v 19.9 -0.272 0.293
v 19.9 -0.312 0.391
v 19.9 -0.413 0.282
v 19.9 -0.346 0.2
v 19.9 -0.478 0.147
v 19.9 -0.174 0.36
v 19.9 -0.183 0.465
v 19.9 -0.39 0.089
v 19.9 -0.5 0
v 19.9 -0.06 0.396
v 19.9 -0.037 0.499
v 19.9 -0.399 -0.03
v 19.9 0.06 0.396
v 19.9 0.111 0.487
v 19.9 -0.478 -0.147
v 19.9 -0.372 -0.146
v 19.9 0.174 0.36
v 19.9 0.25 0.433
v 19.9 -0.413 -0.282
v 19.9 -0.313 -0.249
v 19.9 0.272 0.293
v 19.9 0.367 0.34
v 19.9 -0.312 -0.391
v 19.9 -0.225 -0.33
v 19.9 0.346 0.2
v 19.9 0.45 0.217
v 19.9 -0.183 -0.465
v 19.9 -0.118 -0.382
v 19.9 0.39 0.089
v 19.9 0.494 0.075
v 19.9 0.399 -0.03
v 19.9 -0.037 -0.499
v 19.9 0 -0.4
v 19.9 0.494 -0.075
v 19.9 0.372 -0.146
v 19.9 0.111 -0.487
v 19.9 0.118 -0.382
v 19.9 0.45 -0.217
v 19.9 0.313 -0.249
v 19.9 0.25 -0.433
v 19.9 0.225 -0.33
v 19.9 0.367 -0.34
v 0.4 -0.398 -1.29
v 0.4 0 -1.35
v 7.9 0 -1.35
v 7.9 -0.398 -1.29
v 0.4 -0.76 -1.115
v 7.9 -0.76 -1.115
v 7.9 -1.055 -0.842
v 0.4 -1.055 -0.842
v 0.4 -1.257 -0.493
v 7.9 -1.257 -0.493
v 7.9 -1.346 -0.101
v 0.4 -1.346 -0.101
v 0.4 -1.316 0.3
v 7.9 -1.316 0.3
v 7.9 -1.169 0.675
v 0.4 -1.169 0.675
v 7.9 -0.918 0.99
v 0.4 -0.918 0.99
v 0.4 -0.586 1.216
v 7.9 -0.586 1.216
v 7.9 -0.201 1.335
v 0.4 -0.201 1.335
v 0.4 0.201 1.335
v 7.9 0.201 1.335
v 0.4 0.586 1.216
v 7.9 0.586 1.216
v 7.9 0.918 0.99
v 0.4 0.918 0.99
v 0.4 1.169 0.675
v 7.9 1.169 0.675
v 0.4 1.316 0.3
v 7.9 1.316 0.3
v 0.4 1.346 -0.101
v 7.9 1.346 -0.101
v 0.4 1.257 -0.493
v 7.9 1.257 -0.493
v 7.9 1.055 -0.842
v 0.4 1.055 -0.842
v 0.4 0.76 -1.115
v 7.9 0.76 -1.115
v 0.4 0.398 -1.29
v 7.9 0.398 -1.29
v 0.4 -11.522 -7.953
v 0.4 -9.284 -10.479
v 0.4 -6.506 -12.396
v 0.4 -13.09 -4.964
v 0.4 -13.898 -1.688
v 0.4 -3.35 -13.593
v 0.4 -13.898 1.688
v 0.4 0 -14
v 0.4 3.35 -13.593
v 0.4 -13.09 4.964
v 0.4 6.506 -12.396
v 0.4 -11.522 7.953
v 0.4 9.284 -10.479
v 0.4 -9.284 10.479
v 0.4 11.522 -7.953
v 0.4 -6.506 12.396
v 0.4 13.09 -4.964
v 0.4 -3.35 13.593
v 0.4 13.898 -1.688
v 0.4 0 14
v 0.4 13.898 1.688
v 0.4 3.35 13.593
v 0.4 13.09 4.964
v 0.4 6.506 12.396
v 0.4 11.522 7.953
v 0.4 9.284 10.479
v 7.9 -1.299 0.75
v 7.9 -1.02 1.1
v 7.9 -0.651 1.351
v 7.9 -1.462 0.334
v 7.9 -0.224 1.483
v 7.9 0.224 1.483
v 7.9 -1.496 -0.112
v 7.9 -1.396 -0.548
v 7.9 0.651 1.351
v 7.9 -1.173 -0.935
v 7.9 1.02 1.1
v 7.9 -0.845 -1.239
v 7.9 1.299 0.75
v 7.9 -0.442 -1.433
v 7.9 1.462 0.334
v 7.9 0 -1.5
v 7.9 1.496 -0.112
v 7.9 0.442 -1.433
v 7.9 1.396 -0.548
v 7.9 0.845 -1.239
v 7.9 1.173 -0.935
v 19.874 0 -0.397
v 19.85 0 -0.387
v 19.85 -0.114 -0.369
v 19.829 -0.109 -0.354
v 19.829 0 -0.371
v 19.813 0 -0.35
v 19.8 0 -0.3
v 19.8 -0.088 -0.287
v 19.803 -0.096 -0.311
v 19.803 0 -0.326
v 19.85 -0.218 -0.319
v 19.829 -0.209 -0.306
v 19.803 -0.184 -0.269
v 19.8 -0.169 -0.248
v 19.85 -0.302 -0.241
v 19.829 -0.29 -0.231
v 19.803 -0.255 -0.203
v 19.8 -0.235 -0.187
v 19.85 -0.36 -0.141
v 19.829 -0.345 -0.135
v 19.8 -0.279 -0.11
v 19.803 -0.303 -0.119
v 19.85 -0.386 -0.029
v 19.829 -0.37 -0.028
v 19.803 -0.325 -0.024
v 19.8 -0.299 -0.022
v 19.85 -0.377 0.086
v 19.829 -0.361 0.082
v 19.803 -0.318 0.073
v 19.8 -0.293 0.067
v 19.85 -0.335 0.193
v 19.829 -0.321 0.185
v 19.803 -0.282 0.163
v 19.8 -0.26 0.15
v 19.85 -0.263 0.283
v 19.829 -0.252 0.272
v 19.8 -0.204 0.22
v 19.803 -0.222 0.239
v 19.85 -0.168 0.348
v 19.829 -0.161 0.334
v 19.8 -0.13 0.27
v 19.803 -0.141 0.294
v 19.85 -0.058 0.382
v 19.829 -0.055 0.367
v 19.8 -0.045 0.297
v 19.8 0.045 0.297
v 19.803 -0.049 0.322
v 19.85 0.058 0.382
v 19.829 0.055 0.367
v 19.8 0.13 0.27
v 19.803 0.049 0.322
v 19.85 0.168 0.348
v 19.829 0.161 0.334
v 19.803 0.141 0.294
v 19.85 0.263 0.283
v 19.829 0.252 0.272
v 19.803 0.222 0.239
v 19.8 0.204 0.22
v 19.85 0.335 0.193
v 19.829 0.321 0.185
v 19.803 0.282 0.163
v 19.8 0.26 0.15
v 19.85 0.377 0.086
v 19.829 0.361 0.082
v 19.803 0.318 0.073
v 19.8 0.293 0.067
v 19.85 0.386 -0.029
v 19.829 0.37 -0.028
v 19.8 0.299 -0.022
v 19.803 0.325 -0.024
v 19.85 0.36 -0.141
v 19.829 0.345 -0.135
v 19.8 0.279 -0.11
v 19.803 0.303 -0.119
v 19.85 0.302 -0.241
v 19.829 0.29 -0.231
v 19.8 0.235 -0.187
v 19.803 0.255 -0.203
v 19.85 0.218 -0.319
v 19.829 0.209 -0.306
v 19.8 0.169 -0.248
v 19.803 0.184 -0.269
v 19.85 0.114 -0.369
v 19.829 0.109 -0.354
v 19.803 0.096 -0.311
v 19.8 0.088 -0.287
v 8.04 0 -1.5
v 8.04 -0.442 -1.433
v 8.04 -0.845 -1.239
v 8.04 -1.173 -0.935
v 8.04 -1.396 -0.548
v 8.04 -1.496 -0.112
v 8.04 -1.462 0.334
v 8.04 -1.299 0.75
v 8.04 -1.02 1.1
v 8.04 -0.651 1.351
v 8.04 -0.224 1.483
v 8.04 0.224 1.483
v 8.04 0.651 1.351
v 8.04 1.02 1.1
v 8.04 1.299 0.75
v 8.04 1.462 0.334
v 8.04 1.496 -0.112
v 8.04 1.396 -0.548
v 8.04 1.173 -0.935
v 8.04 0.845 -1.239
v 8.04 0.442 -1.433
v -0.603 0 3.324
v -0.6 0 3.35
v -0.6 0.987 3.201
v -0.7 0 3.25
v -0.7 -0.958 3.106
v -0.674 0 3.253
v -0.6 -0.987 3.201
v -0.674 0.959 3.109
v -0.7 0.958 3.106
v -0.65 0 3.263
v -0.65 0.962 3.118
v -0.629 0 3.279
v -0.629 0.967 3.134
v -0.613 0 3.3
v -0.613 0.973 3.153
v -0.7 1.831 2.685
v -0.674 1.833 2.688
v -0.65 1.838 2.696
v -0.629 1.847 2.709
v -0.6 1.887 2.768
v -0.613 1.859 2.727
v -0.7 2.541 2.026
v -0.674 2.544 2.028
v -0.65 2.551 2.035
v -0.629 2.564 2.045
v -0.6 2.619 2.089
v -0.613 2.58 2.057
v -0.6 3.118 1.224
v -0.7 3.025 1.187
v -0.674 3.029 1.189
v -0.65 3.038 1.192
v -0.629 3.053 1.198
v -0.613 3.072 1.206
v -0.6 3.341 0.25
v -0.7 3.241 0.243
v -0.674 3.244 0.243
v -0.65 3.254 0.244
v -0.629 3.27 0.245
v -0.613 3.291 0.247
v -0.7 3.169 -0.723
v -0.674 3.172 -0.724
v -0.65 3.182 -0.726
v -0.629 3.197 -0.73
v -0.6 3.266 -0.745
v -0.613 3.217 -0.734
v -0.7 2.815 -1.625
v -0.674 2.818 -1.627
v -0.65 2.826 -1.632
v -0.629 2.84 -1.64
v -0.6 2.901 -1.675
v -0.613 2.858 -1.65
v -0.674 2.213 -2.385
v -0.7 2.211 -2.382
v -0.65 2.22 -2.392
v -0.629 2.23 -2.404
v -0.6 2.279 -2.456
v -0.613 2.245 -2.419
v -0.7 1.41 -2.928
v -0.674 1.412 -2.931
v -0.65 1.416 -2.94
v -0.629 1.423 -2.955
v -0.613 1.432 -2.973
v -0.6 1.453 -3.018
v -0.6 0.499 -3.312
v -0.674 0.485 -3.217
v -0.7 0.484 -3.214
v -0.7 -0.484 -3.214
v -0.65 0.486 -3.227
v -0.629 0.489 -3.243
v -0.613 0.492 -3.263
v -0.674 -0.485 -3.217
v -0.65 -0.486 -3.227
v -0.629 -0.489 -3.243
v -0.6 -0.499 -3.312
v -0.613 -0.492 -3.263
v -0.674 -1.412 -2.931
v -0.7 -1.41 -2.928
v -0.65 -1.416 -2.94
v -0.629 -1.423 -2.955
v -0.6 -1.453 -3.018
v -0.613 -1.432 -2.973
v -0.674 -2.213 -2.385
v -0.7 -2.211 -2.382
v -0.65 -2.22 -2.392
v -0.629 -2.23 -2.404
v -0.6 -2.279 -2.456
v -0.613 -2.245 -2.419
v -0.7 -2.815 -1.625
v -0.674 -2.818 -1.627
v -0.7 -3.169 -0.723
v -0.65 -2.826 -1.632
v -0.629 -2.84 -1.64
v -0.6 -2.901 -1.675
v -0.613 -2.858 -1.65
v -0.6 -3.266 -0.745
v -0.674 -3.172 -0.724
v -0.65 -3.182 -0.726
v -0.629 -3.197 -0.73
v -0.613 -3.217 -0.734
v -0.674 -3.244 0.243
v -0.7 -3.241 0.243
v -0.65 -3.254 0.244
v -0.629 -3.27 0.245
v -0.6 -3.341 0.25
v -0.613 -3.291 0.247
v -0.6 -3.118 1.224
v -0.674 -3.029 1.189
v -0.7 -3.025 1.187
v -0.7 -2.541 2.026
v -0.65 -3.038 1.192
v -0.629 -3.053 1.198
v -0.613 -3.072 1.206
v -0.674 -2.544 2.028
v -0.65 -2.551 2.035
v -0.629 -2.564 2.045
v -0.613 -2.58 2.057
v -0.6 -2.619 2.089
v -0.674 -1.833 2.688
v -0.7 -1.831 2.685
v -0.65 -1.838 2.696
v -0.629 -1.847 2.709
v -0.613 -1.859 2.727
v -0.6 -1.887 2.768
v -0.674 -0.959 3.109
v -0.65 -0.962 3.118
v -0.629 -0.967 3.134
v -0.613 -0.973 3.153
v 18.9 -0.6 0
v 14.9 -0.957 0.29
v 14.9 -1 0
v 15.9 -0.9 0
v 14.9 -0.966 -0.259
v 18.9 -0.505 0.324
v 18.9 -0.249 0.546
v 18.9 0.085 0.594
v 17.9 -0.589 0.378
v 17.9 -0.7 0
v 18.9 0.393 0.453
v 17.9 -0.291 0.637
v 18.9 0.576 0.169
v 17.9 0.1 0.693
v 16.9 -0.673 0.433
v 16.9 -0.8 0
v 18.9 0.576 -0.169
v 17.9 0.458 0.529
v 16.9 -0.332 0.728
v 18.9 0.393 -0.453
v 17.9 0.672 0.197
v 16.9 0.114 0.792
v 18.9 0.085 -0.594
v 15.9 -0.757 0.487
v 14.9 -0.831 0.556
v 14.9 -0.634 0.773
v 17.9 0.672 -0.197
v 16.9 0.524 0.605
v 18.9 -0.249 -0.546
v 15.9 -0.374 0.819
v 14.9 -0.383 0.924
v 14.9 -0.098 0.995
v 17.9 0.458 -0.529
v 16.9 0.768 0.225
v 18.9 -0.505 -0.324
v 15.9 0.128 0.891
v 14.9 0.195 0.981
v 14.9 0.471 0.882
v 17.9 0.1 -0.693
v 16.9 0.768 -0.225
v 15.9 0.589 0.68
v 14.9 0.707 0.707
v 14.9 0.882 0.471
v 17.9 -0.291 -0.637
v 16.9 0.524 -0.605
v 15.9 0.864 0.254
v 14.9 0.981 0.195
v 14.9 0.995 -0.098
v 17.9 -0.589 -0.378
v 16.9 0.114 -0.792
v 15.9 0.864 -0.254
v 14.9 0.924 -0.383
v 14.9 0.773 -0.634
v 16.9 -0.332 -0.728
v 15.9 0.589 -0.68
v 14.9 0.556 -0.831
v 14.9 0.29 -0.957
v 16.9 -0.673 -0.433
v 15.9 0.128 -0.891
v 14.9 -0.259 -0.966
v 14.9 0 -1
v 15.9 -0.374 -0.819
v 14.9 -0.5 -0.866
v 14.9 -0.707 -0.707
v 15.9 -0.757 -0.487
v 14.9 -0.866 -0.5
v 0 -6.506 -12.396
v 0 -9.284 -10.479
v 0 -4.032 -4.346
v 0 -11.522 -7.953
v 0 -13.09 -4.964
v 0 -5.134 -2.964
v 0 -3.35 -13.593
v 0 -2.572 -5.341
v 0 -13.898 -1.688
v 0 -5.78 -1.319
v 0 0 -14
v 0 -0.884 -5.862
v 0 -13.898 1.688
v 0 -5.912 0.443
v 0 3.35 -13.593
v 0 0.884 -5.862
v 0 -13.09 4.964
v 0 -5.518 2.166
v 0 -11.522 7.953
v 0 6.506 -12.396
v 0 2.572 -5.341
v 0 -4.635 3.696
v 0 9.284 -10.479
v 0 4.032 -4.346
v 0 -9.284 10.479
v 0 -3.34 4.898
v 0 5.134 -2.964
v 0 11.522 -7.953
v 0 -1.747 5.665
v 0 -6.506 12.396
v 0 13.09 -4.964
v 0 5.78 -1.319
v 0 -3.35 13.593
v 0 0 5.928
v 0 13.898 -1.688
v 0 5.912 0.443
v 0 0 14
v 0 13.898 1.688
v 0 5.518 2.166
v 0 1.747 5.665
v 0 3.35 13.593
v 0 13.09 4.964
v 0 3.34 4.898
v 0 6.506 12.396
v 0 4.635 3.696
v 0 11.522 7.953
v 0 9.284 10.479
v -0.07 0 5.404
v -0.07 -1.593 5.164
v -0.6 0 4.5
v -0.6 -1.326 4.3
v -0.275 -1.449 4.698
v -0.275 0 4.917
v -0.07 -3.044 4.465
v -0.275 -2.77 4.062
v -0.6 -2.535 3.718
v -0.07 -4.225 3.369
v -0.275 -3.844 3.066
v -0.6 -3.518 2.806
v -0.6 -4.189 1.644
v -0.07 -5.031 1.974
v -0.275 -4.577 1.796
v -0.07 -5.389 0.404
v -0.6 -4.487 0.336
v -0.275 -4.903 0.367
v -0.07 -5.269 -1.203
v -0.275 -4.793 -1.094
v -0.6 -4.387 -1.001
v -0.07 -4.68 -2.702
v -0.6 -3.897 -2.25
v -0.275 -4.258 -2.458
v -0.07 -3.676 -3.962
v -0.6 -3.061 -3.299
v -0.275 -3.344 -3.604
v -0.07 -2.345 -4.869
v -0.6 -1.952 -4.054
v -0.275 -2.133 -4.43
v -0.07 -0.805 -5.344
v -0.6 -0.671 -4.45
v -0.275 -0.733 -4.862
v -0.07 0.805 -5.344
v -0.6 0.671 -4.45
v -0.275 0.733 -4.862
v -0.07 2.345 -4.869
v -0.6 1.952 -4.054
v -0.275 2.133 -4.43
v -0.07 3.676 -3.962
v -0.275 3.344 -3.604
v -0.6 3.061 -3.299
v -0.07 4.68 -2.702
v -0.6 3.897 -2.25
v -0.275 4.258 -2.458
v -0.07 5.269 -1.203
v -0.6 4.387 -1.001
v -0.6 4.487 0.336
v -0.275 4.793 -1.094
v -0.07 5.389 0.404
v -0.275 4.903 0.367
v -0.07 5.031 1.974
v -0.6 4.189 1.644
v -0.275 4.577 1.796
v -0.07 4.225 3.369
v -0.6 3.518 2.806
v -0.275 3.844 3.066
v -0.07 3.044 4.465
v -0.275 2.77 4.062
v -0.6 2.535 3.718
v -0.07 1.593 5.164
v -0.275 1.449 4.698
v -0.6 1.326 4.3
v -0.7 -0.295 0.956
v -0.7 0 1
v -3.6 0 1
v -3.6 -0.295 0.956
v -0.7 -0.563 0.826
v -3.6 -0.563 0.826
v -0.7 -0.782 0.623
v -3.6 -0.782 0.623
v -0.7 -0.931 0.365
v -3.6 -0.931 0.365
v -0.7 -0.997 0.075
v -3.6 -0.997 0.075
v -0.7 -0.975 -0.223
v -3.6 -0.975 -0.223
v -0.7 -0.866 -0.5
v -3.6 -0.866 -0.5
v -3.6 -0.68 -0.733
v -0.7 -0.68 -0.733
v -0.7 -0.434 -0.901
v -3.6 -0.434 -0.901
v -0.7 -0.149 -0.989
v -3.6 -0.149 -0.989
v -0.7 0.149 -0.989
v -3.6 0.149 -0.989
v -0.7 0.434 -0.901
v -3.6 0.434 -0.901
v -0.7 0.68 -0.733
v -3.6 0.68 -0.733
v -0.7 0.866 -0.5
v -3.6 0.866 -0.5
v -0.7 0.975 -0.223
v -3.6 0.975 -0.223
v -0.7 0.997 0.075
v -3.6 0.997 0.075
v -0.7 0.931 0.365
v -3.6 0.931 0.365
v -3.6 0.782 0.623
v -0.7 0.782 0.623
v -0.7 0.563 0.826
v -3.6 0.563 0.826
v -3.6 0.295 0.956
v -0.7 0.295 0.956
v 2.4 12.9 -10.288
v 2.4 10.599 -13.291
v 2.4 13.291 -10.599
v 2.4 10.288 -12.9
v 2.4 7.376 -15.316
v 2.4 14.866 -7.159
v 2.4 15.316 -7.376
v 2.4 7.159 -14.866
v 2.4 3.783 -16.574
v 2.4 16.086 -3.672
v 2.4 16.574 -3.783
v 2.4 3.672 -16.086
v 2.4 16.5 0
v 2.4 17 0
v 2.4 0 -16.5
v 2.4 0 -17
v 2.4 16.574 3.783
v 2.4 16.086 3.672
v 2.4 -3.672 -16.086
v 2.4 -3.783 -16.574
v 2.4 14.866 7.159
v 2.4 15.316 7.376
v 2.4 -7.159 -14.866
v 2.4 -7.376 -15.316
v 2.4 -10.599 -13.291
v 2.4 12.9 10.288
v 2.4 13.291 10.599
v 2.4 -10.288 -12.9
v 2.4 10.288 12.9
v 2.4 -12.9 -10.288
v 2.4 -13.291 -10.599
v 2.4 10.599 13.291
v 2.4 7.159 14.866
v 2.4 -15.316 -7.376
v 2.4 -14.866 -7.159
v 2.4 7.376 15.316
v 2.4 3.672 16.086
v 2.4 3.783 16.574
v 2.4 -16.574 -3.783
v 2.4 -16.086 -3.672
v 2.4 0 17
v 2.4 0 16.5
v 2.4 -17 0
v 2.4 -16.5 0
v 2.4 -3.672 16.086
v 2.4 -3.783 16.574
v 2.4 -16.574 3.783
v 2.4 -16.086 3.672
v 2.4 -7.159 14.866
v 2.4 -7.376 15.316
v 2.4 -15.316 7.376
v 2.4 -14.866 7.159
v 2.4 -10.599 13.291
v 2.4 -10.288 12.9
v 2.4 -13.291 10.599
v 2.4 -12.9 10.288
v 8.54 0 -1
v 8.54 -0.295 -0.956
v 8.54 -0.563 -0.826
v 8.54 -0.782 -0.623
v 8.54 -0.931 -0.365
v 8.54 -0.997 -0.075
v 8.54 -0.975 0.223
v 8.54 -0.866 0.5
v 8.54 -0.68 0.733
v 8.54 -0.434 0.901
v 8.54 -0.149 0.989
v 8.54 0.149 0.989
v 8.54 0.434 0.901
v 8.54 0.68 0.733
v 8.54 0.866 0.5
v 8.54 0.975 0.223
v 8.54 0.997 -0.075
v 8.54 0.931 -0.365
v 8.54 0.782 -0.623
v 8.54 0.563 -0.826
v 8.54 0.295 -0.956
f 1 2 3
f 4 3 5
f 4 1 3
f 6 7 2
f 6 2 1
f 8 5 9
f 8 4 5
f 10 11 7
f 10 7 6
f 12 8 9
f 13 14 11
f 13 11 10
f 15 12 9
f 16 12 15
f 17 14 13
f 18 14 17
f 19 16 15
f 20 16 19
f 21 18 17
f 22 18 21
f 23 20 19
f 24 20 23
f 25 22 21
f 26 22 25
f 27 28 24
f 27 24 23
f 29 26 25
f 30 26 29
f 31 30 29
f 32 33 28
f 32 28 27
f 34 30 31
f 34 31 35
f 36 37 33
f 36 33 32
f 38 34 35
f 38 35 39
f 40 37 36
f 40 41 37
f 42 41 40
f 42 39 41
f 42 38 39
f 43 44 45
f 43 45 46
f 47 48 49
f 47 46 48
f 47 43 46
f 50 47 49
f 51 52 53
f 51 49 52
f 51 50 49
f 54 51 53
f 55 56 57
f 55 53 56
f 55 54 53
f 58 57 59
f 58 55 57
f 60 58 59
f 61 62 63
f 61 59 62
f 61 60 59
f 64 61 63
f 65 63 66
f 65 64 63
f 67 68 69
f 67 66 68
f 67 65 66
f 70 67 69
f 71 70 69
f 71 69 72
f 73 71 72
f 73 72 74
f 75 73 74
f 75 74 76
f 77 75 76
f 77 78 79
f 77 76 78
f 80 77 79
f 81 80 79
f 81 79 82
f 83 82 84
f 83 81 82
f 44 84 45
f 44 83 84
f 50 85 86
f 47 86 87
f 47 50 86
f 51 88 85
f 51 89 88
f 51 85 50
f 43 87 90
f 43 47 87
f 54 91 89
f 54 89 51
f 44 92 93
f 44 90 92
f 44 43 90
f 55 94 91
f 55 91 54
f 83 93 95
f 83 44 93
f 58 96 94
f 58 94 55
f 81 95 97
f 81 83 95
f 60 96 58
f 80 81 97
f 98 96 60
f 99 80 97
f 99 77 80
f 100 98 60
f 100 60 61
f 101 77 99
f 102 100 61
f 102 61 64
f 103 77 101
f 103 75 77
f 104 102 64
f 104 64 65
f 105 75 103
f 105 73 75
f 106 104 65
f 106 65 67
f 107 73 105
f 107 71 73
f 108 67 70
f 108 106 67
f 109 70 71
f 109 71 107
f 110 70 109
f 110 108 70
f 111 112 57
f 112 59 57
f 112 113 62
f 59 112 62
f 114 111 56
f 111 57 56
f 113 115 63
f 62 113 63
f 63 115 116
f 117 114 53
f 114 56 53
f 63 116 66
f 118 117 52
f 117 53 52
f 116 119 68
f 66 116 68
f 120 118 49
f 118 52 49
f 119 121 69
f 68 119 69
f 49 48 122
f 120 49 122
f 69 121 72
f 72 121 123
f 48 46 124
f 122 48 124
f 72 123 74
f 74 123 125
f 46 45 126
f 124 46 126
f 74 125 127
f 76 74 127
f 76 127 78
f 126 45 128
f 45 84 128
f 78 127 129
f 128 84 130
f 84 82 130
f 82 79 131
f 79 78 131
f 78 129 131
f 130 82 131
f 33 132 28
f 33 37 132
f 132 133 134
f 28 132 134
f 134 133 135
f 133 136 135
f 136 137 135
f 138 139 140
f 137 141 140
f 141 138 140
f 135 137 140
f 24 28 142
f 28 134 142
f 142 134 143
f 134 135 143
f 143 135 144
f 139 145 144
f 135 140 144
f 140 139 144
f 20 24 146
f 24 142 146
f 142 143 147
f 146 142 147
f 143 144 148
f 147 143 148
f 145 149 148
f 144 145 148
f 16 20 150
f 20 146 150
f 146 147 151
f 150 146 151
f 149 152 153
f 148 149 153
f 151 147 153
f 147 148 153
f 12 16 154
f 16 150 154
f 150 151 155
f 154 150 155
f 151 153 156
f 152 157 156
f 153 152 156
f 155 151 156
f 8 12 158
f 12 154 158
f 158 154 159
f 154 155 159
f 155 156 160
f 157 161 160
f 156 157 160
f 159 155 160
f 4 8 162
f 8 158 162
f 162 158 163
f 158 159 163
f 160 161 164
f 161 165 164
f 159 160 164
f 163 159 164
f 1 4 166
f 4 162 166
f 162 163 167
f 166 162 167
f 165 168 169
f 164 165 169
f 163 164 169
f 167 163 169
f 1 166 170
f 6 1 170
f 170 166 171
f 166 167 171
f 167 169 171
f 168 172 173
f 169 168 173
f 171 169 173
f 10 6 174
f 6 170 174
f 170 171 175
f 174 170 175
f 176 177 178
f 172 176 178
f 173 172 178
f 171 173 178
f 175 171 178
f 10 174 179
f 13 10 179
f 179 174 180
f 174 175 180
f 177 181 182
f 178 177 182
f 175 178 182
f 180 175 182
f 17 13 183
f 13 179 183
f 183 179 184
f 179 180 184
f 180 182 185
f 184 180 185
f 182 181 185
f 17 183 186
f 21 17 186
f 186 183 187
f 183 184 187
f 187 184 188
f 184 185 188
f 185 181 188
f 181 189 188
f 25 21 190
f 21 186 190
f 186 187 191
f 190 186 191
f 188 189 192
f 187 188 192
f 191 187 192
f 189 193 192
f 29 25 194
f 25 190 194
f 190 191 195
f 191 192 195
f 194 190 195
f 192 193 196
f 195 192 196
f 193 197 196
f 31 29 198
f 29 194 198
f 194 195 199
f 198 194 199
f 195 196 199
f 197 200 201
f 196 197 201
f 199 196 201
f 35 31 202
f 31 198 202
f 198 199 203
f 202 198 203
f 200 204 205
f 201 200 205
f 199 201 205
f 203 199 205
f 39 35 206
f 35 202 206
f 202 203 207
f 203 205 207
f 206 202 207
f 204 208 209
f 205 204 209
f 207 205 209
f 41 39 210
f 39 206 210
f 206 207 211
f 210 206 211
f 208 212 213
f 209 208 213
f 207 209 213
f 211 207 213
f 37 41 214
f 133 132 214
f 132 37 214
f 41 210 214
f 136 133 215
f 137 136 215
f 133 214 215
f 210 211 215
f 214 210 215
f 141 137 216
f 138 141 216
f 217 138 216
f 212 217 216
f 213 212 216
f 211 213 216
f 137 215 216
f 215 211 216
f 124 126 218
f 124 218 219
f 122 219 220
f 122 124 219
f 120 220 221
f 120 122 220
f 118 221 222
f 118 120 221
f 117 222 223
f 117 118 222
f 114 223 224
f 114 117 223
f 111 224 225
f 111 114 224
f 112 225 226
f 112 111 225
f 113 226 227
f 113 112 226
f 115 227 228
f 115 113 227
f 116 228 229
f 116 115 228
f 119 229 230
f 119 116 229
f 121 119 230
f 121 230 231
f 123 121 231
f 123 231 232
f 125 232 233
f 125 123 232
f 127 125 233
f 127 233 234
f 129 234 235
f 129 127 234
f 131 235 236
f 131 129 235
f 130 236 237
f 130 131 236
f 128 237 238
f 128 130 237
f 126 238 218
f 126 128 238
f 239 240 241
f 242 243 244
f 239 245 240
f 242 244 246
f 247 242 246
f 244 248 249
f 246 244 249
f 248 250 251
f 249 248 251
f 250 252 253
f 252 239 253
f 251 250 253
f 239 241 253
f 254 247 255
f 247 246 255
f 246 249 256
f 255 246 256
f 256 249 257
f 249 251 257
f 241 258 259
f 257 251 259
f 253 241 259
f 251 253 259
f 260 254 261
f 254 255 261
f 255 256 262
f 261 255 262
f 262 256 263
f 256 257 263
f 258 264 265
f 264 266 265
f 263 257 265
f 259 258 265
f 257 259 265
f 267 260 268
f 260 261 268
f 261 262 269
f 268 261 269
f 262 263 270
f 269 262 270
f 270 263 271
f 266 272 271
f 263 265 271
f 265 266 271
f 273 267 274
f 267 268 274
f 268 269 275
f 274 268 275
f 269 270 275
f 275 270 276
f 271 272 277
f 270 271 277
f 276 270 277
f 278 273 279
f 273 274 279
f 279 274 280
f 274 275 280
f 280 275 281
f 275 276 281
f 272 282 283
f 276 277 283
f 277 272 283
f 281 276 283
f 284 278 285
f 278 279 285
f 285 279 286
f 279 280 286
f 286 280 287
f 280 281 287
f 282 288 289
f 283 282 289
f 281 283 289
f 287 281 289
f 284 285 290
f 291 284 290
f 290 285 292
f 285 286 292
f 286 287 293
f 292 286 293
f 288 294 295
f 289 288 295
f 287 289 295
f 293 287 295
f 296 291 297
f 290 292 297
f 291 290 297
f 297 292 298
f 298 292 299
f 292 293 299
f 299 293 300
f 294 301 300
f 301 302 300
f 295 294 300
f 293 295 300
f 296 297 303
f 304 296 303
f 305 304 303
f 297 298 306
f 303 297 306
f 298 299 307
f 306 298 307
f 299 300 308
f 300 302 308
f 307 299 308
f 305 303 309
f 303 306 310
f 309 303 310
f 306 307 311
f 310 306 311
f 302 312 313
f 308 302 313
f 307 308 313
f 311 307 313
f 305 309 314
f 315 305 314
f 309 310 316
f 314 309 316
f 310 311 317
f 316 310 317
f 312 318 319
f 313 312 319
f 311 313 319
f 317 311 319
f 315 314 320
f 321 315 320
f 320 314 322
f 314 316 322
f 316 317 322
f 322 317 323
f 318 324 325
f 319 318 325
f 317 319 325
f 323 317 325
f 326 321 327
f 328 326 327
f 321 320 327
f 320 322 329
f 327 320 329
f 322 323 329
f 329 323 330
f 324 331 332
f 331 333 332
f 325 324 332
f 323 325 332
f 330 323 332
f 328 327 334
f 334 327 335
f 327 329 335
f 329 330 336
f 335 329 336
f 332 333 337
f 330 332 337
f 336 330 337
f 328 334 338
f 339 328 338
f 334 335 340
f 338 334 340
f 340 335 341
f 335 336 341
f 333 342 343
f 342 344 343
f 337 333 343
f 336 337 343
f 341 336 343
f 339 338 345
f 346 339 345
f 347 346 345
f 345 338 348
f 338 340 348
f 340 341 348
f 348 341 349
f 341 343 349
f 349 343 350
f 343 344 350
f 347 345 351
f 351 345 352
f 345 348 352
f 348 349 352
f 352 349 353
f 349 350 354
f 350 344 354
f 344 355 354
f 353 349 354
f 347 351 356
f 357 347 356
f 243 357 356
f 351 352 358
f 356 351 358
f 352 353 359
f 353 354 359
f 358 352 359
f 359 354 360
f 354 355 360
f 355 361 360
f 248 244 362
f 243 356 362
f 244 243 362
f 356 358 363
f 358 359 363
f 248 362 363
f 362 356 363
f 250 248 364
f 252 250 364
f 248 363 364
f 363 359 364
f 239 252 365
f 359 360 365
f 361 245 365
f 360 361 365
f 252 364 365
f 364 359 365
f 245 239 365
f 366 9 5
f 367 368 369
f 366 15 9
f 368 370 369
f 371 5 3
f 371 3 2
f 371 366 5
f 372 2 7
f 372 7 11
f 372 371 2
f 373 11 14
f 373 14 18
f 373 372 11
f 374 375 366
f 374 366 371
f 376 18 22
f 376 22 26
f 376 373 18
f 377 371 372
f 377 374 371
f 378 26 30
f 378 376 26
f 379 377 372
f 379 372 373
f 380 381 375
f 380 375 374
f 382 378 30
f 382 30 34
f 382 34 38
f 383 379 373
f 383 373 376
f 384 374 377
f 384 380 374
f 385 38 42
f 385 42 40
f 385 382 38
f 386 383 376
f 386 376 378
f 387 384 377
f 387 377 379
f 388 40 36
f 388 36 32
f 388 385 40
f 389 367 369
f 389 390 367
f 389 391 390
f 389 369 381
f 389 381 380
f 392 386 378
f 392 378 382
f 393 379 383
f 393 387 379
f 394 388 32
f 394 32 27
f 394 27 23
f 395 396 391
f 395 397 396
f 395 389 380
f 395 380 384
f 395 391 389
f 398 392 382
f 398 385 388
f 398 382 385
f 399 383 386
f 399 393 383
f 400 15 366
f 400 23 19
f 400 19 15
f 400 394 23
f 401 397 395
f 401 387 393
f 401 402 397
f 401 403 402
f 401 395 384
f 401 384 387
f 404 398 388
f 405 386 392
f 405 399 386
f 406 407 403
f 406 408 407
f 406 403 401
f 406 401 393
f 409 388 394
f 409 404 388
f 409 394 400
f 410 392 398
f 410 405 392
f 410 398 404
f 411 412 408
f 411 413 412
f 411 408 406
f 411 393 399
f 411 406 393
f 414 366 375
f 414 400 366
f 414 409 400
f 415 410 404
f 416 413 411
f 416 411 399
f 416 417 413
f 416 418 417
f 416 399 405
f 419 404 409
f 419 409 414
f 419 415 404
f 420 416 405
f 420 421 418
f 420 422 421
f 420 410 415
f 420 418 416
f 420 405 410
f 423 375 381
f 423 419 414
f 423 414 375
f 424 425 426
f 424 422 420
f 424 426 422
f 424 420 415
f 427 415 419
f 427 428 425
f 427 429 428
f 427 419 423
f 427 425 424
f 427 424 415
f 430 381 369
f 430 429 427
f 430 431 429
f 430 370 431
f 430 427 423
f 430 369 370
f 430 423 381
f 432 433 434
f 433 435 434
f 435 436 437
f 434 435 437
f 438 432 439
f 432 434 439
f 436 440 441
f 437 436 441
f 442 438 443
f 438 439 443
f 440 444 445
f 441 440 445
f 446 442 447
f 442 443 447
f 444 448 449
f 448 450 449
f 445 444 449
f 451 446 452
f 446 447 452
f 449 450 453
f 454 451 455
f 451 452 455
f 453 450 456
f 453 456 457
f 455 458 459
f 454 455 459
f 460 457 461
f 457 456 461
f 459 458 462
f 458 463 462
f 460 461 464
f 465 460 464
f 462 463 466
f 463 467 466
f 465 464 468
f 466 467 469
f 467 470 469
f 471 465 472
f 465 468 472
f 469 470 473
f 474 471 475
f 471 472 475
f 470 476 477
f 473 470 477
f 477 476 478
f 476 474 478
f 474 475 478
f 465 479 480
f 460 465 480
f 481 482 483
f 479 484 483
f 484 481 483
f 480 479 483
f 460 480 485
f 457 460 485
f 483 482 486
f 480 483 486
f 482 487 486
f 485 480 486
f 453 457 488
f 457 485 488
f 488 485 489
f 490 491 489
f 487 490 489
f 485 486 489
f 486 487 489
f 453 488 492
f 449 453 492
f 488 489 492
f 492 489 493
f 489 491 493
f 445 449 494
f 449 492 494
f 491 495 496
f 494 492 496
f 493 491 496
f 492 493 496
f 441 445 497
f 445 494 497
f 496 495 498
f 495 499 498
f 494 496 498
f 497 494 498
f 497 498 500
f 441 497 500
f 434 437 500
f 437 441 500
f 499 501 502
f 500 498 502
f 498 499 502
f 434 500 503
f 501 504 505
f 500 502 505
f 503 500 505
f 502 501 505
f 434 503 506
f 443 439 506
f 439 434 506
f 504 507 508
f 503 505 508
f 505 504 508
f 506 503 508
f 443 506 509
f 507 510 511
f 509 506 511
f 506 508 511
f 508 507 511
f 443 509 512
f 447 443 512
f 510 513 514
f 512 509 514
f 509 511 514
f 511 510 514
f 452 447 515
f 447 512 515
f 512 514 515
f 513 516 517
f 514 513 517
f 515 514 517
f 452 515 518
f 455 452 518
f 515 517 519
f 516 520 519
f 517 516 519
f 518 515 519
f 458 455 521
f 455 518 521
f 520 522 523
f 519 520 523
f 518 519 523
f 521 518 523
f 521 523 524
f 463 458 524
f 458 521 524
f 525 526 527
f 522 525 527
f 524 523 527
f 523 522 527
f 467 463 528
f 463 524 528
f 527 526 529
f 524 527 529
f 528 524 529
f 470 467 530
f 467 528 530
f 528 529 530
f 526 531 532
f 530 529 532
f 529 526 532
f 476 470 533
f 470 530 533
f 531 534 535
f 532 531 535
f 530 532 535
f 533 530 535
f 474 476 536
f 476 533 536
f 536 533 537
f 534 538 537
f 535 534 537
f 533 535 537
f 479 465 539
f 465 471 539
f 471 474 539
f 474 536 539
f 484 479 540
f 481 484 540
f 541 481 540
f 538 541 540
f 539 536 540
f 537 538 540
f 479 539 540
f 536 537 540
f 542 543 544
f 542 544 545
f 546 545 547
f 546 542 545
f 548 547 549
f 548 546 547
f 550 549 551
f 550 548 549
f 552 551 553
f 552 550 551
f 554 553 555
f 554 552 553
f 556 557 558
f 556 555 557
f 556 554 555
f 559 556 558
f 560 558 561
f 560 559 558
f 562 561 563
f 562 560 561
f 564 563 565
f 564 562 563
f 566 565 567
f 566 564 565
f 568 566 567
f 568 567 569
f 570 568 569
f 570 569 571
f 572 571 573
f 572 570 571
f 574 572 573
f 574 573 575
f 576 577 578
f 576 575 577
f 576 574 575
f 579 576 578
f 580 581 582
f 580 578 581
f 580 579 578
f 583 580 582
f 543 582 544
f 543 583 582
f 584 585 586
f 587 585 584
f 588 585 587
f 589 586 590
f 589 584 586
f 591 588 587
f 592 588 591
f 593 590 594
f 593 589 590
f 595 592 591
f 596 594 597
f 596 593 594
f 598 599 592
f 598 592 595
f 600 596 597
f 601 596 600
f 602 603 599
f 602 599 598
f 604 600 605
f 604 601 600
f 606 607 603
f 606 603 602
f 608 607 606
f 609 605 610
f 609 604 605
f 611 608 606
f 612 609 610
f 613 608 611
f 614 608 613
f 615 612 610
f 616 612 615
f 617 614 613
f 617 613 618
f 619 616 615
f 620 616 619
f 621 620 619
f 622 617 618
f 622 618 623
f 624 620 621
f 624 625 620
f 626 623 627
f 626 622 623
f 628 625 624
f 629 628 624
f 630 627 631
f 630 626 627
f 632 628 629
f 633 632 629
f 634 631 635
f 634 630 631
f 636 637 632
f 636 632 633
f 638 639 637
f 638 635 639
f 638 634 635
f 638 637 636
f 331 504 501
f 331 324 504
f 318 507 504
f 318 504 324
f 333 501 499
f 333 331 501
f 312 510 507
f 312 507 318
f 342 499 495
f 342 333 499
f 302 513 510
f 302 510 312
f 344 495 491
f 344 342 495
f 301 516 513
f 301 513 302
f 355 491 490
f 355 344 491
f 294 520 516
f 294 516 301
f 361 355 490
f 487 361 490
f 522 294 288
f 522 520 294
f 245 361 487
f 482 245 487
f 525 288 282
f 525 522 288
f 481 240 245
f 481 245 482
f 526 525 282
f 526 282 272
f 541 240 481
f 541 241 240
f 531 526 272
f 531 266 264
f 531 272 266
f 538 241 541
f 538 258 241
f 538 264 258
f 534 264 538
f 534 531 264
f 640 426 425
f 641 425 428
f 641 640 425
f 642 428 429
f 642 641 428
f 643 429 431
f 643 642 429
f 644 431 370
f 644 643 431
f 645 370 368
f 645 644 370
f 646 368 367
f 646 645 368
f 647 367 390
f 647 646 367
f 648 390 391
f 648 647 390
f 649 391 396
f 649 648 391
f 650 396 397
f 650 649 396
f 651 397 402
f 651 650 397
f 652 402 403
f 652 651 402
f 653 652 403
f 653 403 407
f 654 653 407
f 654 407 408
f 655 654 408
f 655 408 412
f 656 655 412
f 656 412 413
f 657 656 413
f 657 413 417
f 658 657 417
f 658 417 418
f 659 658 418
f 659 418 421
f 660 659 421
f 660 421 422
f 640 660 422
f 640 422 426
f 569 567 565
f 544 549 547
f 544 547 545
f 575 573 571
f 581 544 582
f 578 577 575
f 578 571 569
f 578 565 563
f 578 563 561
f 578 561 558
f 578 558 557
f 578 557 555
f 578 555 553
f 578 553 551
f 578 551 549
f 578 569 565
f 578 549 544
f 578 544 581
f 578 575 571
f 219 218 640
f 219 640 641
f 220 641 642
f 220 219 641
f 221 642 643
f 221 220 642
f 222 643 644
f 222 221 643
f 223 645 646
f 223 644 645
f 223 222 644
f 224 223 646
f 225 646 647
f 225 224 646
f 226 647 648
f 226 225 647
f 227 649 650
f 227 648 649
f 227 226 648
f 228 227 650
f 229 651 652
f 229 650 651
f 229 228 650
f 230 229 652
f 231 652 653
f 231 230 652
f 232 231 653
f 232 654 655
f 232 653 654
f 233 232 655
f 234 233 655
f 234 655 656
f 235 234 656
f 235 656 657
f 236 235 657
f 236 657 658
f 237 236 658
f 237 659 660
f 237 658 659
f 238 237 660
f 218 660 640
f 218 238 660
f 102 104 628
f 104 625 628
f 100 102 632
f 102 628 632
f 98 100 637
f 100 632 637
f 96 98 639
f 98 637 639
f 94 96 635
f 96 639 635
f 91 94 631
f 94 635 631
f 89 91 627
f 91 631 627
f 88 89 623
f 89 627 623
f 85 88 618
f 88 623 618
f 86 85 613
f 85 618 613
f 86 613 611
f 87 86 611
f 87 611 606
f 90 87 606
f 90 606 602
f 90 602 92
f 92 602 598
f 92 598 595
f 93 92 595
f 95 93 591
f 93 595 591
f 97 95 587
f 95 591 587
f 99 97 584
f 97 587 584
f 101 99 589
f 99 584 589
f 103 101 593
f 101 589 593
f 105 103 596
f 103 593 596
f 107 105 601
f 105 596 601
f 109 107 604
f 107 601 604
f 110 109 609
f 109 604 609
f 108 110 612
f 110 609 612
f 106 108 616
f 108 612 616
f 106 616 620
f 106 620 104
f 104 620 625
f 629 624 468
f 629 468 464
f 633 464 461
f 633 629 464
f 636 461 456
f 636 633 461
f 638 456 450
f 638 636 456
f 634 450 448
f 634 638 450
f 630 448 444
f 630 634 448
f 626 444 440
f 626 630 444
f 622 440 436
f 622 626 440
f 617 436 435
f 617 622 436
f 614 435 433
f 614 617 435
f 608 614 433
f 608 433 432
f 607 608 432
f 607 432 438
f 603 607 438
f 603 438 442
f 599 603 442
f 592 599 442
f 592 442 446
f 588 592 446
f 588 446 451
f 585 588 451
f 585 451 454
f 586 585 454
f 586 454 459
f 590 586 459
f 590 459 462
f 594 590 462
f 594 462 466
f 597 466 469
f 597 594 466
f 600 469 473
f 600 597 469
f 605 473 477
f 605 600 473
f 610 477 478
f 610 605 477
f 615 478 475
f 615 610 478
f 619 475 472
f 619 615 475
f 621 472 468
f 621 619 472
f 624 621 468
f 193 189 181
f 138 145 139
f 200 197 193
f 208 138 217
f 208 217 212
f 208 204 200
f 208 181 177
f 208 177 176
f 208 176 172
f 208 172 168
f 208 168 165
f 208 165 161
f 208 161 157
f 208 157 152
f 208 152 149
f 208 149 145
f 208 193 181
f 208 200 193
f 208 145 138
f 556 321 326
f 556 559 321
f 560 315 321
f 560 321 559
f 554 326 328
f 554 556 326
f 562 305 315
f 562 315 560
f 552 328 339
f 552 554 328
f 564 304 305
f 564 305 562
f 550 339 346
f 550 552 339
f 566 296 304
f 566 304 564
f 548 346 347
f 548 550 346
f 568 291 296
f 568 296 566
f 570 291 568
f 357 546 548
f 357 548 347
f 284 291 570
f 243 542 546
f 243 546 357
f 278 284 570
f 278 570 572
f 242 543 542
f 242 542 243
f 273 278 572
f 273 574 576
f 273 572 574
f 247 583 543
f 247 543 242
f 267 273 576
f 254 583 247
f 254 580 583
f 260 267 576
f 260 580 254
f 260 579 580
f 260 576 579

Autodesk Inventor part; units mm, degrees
ref_plane "YZ Plane" through (0, 0, 0) normal (1, 0, 0) x (0, 1, 0)
ref_plane "XZ Plane" through (0, 0, 0) normal (0, 1, 0) x (-1, 0, 0)
sketch "Sketch1" plane through (0, 0, 0) normal (1, 0, 0) x (0, 1, 0)
  circle A0 centre (0, 0) radius 17
  circle A1 centre (0, 0) radius 14
  dimension "d0" = 34
  dimension "d1" = 28
extrude "Extrusion1" add sketch "Sketch1" along normal blind 0.4 contours A1
ref_plane "Work Plane1" through (2.4, 0, 0) normal (1, 0, 0) x (0, 0, -1)
sketch "Sketch2" plane through (2.4, 0, 0) normal (1, 0, 0) x (0, 0, -1)
  circle A0 centre (0, 0) radius 17
  dimension "d5" = 34
sketch "Sketch3" plane through (0, 0, 0) normal (0, 1, 0) x (-1, 0, 0)
  line L0 (-2.4, 17) -> (-2.4, -17) projected
  line L1 (0, 14) -> (0, -14) projected
  line L2 (0, 14) -> (-2.4, 17)
  line L3 (-0.4, 14) -> (-0.4, -14) projected
  line L4 (-0.4, 14) -> (-2.4, 16.5)
  line L5 (-0.4, 0) -> (-1.3096, 0)
  line L6 (0, 14) -> (-0.4, 14)
  line L7 (-2.4, 16.5) -> (-2.4, 17)
  point P0 (0, 0)
revolve "Revolution1" add sketch "Sketch3" angle 360 about axis through (0.4, 0, 0) along (1, 0, 0)
sketch "Sketch4" plane through (0, 0, 0) normal (-1, 0, 0) x (0, 0, 1)
  circle A0 centre (0, 0) radius 14 projected
  circle A1 centre (0, 0) radius 4.5
  dimension "d7" = 9
extrude "Extrusion2" add sketch "Sketch4" along normal blind 0.6 contours A1
fillet "Fillet1" radius 2 1 edges at (0, 0, -4.5)
sketch "Sketch5" plane through (-0.6, 0, 0) normal (-1, 0, 0) x (0, 0, 1)
  circle A0 centre (0, 0) radius 4.5 projected
  circle A1 centre (0, 0) radius 1
  dimension "d11" = 2
extrude "Extrusion3" add sketch "Sketch5" along normal blind 3 contours A1
sketch "Sketch6" plane through (0.4, 0, 0) normal (1, 0, 0) x (0, 0, -1)
  circle A0 centre (0, 0) radius 14 projected
  circle A1 centre (0, 0) radius 1.35
  dimension "d14" = 2.7
extrude "Extrusion4" add sketch "Sketch6" along normal blind 7.5 contours A1
sketch "Sketch7" plane through (7.9, 0, 0) normal (1, 0, 0) x (0, 0, -1)
  circle A0 centre (0, 0) radius 1 projected
  circle A1 centre (0, 0) radius 1.5
  dimension "d17" = 3
extrude "Extrusion5" add sketch "Sketch7" along normal blind 0.14 contours A0 | A1
sketch "Sketch8" plane through (8.04, 0, 0) normal (1, 0, 0) x (0, 0, -1)
  circle A0 centre (0, 0) radius 1.5 projected
  circle A1 centre (0, 0) radius 1
  dimension "d20" = 2
extrude "Extrusion6" add sketch "Sketch8" along normal blind 11.86 contours A1
chamfer "Chamfer1" distance 0.5 angle 45 1 edges at (8.04, 0, 1)
sketch "Sketch9" plane through (0, 0, 0) normal (0, 0, 1) x (1, 0, 0)
  line L0 (19.9, -1) -> (19.9, 1) projected
  line L1 (19.9, -0.5) -> (14.9, -1)
  line L2 (8.54, -1) -> (19.9, -1) projected
  line L3 (19.9, -0.5) -> (19.9, -1)
  line L4 (19.9, -1) -> (15, -1)
  line L5 (23, 0) -> (21.1668, 0)
  point P0 (0, 0)
  dimension "d26" = 0.5
  dimension "d27" = 5
revolve "Revolution2" cut sketch "Sketch9" angle 360 about axis through (23, 0, 0) along (-1, 0, 0)
sketch "Sketch10" plane through (19.9, 0, 0) normal (1, 0, 0) x (0, 0, -1)
  circle A0 centre (0, 0) radius 0.5 projected
  circle A1 centre (0, 0) radius 0.4
  dimension "d29" = 0.8
extrude "Extrusion7" cut sketch "Sketch10" against normal blind 0.1 contours A1
fillet "Fillet2" radius 0.1 1 edges at (19.8, 0, 0.4)
sketch "Sketch11" plane through (-0.6, 0, 0) normal (-1, 0, 0) x (0, 0, 1)
  circle A0 centre (0, 0) radius 1 projected
  circle A1 centre (0, 0) radius 4.5 projected
  circle A2 centre (0, 0) radius 3.25
  dimension "d33" = 6.5
extrude "Extrusion8" add sketch "Sketch11" along normal blind 0.1 contours A2
fillet "Fillet3" radius 0.1 1 edges at (-0.6, 0, -3.25)
properties part number "rubber replica"
